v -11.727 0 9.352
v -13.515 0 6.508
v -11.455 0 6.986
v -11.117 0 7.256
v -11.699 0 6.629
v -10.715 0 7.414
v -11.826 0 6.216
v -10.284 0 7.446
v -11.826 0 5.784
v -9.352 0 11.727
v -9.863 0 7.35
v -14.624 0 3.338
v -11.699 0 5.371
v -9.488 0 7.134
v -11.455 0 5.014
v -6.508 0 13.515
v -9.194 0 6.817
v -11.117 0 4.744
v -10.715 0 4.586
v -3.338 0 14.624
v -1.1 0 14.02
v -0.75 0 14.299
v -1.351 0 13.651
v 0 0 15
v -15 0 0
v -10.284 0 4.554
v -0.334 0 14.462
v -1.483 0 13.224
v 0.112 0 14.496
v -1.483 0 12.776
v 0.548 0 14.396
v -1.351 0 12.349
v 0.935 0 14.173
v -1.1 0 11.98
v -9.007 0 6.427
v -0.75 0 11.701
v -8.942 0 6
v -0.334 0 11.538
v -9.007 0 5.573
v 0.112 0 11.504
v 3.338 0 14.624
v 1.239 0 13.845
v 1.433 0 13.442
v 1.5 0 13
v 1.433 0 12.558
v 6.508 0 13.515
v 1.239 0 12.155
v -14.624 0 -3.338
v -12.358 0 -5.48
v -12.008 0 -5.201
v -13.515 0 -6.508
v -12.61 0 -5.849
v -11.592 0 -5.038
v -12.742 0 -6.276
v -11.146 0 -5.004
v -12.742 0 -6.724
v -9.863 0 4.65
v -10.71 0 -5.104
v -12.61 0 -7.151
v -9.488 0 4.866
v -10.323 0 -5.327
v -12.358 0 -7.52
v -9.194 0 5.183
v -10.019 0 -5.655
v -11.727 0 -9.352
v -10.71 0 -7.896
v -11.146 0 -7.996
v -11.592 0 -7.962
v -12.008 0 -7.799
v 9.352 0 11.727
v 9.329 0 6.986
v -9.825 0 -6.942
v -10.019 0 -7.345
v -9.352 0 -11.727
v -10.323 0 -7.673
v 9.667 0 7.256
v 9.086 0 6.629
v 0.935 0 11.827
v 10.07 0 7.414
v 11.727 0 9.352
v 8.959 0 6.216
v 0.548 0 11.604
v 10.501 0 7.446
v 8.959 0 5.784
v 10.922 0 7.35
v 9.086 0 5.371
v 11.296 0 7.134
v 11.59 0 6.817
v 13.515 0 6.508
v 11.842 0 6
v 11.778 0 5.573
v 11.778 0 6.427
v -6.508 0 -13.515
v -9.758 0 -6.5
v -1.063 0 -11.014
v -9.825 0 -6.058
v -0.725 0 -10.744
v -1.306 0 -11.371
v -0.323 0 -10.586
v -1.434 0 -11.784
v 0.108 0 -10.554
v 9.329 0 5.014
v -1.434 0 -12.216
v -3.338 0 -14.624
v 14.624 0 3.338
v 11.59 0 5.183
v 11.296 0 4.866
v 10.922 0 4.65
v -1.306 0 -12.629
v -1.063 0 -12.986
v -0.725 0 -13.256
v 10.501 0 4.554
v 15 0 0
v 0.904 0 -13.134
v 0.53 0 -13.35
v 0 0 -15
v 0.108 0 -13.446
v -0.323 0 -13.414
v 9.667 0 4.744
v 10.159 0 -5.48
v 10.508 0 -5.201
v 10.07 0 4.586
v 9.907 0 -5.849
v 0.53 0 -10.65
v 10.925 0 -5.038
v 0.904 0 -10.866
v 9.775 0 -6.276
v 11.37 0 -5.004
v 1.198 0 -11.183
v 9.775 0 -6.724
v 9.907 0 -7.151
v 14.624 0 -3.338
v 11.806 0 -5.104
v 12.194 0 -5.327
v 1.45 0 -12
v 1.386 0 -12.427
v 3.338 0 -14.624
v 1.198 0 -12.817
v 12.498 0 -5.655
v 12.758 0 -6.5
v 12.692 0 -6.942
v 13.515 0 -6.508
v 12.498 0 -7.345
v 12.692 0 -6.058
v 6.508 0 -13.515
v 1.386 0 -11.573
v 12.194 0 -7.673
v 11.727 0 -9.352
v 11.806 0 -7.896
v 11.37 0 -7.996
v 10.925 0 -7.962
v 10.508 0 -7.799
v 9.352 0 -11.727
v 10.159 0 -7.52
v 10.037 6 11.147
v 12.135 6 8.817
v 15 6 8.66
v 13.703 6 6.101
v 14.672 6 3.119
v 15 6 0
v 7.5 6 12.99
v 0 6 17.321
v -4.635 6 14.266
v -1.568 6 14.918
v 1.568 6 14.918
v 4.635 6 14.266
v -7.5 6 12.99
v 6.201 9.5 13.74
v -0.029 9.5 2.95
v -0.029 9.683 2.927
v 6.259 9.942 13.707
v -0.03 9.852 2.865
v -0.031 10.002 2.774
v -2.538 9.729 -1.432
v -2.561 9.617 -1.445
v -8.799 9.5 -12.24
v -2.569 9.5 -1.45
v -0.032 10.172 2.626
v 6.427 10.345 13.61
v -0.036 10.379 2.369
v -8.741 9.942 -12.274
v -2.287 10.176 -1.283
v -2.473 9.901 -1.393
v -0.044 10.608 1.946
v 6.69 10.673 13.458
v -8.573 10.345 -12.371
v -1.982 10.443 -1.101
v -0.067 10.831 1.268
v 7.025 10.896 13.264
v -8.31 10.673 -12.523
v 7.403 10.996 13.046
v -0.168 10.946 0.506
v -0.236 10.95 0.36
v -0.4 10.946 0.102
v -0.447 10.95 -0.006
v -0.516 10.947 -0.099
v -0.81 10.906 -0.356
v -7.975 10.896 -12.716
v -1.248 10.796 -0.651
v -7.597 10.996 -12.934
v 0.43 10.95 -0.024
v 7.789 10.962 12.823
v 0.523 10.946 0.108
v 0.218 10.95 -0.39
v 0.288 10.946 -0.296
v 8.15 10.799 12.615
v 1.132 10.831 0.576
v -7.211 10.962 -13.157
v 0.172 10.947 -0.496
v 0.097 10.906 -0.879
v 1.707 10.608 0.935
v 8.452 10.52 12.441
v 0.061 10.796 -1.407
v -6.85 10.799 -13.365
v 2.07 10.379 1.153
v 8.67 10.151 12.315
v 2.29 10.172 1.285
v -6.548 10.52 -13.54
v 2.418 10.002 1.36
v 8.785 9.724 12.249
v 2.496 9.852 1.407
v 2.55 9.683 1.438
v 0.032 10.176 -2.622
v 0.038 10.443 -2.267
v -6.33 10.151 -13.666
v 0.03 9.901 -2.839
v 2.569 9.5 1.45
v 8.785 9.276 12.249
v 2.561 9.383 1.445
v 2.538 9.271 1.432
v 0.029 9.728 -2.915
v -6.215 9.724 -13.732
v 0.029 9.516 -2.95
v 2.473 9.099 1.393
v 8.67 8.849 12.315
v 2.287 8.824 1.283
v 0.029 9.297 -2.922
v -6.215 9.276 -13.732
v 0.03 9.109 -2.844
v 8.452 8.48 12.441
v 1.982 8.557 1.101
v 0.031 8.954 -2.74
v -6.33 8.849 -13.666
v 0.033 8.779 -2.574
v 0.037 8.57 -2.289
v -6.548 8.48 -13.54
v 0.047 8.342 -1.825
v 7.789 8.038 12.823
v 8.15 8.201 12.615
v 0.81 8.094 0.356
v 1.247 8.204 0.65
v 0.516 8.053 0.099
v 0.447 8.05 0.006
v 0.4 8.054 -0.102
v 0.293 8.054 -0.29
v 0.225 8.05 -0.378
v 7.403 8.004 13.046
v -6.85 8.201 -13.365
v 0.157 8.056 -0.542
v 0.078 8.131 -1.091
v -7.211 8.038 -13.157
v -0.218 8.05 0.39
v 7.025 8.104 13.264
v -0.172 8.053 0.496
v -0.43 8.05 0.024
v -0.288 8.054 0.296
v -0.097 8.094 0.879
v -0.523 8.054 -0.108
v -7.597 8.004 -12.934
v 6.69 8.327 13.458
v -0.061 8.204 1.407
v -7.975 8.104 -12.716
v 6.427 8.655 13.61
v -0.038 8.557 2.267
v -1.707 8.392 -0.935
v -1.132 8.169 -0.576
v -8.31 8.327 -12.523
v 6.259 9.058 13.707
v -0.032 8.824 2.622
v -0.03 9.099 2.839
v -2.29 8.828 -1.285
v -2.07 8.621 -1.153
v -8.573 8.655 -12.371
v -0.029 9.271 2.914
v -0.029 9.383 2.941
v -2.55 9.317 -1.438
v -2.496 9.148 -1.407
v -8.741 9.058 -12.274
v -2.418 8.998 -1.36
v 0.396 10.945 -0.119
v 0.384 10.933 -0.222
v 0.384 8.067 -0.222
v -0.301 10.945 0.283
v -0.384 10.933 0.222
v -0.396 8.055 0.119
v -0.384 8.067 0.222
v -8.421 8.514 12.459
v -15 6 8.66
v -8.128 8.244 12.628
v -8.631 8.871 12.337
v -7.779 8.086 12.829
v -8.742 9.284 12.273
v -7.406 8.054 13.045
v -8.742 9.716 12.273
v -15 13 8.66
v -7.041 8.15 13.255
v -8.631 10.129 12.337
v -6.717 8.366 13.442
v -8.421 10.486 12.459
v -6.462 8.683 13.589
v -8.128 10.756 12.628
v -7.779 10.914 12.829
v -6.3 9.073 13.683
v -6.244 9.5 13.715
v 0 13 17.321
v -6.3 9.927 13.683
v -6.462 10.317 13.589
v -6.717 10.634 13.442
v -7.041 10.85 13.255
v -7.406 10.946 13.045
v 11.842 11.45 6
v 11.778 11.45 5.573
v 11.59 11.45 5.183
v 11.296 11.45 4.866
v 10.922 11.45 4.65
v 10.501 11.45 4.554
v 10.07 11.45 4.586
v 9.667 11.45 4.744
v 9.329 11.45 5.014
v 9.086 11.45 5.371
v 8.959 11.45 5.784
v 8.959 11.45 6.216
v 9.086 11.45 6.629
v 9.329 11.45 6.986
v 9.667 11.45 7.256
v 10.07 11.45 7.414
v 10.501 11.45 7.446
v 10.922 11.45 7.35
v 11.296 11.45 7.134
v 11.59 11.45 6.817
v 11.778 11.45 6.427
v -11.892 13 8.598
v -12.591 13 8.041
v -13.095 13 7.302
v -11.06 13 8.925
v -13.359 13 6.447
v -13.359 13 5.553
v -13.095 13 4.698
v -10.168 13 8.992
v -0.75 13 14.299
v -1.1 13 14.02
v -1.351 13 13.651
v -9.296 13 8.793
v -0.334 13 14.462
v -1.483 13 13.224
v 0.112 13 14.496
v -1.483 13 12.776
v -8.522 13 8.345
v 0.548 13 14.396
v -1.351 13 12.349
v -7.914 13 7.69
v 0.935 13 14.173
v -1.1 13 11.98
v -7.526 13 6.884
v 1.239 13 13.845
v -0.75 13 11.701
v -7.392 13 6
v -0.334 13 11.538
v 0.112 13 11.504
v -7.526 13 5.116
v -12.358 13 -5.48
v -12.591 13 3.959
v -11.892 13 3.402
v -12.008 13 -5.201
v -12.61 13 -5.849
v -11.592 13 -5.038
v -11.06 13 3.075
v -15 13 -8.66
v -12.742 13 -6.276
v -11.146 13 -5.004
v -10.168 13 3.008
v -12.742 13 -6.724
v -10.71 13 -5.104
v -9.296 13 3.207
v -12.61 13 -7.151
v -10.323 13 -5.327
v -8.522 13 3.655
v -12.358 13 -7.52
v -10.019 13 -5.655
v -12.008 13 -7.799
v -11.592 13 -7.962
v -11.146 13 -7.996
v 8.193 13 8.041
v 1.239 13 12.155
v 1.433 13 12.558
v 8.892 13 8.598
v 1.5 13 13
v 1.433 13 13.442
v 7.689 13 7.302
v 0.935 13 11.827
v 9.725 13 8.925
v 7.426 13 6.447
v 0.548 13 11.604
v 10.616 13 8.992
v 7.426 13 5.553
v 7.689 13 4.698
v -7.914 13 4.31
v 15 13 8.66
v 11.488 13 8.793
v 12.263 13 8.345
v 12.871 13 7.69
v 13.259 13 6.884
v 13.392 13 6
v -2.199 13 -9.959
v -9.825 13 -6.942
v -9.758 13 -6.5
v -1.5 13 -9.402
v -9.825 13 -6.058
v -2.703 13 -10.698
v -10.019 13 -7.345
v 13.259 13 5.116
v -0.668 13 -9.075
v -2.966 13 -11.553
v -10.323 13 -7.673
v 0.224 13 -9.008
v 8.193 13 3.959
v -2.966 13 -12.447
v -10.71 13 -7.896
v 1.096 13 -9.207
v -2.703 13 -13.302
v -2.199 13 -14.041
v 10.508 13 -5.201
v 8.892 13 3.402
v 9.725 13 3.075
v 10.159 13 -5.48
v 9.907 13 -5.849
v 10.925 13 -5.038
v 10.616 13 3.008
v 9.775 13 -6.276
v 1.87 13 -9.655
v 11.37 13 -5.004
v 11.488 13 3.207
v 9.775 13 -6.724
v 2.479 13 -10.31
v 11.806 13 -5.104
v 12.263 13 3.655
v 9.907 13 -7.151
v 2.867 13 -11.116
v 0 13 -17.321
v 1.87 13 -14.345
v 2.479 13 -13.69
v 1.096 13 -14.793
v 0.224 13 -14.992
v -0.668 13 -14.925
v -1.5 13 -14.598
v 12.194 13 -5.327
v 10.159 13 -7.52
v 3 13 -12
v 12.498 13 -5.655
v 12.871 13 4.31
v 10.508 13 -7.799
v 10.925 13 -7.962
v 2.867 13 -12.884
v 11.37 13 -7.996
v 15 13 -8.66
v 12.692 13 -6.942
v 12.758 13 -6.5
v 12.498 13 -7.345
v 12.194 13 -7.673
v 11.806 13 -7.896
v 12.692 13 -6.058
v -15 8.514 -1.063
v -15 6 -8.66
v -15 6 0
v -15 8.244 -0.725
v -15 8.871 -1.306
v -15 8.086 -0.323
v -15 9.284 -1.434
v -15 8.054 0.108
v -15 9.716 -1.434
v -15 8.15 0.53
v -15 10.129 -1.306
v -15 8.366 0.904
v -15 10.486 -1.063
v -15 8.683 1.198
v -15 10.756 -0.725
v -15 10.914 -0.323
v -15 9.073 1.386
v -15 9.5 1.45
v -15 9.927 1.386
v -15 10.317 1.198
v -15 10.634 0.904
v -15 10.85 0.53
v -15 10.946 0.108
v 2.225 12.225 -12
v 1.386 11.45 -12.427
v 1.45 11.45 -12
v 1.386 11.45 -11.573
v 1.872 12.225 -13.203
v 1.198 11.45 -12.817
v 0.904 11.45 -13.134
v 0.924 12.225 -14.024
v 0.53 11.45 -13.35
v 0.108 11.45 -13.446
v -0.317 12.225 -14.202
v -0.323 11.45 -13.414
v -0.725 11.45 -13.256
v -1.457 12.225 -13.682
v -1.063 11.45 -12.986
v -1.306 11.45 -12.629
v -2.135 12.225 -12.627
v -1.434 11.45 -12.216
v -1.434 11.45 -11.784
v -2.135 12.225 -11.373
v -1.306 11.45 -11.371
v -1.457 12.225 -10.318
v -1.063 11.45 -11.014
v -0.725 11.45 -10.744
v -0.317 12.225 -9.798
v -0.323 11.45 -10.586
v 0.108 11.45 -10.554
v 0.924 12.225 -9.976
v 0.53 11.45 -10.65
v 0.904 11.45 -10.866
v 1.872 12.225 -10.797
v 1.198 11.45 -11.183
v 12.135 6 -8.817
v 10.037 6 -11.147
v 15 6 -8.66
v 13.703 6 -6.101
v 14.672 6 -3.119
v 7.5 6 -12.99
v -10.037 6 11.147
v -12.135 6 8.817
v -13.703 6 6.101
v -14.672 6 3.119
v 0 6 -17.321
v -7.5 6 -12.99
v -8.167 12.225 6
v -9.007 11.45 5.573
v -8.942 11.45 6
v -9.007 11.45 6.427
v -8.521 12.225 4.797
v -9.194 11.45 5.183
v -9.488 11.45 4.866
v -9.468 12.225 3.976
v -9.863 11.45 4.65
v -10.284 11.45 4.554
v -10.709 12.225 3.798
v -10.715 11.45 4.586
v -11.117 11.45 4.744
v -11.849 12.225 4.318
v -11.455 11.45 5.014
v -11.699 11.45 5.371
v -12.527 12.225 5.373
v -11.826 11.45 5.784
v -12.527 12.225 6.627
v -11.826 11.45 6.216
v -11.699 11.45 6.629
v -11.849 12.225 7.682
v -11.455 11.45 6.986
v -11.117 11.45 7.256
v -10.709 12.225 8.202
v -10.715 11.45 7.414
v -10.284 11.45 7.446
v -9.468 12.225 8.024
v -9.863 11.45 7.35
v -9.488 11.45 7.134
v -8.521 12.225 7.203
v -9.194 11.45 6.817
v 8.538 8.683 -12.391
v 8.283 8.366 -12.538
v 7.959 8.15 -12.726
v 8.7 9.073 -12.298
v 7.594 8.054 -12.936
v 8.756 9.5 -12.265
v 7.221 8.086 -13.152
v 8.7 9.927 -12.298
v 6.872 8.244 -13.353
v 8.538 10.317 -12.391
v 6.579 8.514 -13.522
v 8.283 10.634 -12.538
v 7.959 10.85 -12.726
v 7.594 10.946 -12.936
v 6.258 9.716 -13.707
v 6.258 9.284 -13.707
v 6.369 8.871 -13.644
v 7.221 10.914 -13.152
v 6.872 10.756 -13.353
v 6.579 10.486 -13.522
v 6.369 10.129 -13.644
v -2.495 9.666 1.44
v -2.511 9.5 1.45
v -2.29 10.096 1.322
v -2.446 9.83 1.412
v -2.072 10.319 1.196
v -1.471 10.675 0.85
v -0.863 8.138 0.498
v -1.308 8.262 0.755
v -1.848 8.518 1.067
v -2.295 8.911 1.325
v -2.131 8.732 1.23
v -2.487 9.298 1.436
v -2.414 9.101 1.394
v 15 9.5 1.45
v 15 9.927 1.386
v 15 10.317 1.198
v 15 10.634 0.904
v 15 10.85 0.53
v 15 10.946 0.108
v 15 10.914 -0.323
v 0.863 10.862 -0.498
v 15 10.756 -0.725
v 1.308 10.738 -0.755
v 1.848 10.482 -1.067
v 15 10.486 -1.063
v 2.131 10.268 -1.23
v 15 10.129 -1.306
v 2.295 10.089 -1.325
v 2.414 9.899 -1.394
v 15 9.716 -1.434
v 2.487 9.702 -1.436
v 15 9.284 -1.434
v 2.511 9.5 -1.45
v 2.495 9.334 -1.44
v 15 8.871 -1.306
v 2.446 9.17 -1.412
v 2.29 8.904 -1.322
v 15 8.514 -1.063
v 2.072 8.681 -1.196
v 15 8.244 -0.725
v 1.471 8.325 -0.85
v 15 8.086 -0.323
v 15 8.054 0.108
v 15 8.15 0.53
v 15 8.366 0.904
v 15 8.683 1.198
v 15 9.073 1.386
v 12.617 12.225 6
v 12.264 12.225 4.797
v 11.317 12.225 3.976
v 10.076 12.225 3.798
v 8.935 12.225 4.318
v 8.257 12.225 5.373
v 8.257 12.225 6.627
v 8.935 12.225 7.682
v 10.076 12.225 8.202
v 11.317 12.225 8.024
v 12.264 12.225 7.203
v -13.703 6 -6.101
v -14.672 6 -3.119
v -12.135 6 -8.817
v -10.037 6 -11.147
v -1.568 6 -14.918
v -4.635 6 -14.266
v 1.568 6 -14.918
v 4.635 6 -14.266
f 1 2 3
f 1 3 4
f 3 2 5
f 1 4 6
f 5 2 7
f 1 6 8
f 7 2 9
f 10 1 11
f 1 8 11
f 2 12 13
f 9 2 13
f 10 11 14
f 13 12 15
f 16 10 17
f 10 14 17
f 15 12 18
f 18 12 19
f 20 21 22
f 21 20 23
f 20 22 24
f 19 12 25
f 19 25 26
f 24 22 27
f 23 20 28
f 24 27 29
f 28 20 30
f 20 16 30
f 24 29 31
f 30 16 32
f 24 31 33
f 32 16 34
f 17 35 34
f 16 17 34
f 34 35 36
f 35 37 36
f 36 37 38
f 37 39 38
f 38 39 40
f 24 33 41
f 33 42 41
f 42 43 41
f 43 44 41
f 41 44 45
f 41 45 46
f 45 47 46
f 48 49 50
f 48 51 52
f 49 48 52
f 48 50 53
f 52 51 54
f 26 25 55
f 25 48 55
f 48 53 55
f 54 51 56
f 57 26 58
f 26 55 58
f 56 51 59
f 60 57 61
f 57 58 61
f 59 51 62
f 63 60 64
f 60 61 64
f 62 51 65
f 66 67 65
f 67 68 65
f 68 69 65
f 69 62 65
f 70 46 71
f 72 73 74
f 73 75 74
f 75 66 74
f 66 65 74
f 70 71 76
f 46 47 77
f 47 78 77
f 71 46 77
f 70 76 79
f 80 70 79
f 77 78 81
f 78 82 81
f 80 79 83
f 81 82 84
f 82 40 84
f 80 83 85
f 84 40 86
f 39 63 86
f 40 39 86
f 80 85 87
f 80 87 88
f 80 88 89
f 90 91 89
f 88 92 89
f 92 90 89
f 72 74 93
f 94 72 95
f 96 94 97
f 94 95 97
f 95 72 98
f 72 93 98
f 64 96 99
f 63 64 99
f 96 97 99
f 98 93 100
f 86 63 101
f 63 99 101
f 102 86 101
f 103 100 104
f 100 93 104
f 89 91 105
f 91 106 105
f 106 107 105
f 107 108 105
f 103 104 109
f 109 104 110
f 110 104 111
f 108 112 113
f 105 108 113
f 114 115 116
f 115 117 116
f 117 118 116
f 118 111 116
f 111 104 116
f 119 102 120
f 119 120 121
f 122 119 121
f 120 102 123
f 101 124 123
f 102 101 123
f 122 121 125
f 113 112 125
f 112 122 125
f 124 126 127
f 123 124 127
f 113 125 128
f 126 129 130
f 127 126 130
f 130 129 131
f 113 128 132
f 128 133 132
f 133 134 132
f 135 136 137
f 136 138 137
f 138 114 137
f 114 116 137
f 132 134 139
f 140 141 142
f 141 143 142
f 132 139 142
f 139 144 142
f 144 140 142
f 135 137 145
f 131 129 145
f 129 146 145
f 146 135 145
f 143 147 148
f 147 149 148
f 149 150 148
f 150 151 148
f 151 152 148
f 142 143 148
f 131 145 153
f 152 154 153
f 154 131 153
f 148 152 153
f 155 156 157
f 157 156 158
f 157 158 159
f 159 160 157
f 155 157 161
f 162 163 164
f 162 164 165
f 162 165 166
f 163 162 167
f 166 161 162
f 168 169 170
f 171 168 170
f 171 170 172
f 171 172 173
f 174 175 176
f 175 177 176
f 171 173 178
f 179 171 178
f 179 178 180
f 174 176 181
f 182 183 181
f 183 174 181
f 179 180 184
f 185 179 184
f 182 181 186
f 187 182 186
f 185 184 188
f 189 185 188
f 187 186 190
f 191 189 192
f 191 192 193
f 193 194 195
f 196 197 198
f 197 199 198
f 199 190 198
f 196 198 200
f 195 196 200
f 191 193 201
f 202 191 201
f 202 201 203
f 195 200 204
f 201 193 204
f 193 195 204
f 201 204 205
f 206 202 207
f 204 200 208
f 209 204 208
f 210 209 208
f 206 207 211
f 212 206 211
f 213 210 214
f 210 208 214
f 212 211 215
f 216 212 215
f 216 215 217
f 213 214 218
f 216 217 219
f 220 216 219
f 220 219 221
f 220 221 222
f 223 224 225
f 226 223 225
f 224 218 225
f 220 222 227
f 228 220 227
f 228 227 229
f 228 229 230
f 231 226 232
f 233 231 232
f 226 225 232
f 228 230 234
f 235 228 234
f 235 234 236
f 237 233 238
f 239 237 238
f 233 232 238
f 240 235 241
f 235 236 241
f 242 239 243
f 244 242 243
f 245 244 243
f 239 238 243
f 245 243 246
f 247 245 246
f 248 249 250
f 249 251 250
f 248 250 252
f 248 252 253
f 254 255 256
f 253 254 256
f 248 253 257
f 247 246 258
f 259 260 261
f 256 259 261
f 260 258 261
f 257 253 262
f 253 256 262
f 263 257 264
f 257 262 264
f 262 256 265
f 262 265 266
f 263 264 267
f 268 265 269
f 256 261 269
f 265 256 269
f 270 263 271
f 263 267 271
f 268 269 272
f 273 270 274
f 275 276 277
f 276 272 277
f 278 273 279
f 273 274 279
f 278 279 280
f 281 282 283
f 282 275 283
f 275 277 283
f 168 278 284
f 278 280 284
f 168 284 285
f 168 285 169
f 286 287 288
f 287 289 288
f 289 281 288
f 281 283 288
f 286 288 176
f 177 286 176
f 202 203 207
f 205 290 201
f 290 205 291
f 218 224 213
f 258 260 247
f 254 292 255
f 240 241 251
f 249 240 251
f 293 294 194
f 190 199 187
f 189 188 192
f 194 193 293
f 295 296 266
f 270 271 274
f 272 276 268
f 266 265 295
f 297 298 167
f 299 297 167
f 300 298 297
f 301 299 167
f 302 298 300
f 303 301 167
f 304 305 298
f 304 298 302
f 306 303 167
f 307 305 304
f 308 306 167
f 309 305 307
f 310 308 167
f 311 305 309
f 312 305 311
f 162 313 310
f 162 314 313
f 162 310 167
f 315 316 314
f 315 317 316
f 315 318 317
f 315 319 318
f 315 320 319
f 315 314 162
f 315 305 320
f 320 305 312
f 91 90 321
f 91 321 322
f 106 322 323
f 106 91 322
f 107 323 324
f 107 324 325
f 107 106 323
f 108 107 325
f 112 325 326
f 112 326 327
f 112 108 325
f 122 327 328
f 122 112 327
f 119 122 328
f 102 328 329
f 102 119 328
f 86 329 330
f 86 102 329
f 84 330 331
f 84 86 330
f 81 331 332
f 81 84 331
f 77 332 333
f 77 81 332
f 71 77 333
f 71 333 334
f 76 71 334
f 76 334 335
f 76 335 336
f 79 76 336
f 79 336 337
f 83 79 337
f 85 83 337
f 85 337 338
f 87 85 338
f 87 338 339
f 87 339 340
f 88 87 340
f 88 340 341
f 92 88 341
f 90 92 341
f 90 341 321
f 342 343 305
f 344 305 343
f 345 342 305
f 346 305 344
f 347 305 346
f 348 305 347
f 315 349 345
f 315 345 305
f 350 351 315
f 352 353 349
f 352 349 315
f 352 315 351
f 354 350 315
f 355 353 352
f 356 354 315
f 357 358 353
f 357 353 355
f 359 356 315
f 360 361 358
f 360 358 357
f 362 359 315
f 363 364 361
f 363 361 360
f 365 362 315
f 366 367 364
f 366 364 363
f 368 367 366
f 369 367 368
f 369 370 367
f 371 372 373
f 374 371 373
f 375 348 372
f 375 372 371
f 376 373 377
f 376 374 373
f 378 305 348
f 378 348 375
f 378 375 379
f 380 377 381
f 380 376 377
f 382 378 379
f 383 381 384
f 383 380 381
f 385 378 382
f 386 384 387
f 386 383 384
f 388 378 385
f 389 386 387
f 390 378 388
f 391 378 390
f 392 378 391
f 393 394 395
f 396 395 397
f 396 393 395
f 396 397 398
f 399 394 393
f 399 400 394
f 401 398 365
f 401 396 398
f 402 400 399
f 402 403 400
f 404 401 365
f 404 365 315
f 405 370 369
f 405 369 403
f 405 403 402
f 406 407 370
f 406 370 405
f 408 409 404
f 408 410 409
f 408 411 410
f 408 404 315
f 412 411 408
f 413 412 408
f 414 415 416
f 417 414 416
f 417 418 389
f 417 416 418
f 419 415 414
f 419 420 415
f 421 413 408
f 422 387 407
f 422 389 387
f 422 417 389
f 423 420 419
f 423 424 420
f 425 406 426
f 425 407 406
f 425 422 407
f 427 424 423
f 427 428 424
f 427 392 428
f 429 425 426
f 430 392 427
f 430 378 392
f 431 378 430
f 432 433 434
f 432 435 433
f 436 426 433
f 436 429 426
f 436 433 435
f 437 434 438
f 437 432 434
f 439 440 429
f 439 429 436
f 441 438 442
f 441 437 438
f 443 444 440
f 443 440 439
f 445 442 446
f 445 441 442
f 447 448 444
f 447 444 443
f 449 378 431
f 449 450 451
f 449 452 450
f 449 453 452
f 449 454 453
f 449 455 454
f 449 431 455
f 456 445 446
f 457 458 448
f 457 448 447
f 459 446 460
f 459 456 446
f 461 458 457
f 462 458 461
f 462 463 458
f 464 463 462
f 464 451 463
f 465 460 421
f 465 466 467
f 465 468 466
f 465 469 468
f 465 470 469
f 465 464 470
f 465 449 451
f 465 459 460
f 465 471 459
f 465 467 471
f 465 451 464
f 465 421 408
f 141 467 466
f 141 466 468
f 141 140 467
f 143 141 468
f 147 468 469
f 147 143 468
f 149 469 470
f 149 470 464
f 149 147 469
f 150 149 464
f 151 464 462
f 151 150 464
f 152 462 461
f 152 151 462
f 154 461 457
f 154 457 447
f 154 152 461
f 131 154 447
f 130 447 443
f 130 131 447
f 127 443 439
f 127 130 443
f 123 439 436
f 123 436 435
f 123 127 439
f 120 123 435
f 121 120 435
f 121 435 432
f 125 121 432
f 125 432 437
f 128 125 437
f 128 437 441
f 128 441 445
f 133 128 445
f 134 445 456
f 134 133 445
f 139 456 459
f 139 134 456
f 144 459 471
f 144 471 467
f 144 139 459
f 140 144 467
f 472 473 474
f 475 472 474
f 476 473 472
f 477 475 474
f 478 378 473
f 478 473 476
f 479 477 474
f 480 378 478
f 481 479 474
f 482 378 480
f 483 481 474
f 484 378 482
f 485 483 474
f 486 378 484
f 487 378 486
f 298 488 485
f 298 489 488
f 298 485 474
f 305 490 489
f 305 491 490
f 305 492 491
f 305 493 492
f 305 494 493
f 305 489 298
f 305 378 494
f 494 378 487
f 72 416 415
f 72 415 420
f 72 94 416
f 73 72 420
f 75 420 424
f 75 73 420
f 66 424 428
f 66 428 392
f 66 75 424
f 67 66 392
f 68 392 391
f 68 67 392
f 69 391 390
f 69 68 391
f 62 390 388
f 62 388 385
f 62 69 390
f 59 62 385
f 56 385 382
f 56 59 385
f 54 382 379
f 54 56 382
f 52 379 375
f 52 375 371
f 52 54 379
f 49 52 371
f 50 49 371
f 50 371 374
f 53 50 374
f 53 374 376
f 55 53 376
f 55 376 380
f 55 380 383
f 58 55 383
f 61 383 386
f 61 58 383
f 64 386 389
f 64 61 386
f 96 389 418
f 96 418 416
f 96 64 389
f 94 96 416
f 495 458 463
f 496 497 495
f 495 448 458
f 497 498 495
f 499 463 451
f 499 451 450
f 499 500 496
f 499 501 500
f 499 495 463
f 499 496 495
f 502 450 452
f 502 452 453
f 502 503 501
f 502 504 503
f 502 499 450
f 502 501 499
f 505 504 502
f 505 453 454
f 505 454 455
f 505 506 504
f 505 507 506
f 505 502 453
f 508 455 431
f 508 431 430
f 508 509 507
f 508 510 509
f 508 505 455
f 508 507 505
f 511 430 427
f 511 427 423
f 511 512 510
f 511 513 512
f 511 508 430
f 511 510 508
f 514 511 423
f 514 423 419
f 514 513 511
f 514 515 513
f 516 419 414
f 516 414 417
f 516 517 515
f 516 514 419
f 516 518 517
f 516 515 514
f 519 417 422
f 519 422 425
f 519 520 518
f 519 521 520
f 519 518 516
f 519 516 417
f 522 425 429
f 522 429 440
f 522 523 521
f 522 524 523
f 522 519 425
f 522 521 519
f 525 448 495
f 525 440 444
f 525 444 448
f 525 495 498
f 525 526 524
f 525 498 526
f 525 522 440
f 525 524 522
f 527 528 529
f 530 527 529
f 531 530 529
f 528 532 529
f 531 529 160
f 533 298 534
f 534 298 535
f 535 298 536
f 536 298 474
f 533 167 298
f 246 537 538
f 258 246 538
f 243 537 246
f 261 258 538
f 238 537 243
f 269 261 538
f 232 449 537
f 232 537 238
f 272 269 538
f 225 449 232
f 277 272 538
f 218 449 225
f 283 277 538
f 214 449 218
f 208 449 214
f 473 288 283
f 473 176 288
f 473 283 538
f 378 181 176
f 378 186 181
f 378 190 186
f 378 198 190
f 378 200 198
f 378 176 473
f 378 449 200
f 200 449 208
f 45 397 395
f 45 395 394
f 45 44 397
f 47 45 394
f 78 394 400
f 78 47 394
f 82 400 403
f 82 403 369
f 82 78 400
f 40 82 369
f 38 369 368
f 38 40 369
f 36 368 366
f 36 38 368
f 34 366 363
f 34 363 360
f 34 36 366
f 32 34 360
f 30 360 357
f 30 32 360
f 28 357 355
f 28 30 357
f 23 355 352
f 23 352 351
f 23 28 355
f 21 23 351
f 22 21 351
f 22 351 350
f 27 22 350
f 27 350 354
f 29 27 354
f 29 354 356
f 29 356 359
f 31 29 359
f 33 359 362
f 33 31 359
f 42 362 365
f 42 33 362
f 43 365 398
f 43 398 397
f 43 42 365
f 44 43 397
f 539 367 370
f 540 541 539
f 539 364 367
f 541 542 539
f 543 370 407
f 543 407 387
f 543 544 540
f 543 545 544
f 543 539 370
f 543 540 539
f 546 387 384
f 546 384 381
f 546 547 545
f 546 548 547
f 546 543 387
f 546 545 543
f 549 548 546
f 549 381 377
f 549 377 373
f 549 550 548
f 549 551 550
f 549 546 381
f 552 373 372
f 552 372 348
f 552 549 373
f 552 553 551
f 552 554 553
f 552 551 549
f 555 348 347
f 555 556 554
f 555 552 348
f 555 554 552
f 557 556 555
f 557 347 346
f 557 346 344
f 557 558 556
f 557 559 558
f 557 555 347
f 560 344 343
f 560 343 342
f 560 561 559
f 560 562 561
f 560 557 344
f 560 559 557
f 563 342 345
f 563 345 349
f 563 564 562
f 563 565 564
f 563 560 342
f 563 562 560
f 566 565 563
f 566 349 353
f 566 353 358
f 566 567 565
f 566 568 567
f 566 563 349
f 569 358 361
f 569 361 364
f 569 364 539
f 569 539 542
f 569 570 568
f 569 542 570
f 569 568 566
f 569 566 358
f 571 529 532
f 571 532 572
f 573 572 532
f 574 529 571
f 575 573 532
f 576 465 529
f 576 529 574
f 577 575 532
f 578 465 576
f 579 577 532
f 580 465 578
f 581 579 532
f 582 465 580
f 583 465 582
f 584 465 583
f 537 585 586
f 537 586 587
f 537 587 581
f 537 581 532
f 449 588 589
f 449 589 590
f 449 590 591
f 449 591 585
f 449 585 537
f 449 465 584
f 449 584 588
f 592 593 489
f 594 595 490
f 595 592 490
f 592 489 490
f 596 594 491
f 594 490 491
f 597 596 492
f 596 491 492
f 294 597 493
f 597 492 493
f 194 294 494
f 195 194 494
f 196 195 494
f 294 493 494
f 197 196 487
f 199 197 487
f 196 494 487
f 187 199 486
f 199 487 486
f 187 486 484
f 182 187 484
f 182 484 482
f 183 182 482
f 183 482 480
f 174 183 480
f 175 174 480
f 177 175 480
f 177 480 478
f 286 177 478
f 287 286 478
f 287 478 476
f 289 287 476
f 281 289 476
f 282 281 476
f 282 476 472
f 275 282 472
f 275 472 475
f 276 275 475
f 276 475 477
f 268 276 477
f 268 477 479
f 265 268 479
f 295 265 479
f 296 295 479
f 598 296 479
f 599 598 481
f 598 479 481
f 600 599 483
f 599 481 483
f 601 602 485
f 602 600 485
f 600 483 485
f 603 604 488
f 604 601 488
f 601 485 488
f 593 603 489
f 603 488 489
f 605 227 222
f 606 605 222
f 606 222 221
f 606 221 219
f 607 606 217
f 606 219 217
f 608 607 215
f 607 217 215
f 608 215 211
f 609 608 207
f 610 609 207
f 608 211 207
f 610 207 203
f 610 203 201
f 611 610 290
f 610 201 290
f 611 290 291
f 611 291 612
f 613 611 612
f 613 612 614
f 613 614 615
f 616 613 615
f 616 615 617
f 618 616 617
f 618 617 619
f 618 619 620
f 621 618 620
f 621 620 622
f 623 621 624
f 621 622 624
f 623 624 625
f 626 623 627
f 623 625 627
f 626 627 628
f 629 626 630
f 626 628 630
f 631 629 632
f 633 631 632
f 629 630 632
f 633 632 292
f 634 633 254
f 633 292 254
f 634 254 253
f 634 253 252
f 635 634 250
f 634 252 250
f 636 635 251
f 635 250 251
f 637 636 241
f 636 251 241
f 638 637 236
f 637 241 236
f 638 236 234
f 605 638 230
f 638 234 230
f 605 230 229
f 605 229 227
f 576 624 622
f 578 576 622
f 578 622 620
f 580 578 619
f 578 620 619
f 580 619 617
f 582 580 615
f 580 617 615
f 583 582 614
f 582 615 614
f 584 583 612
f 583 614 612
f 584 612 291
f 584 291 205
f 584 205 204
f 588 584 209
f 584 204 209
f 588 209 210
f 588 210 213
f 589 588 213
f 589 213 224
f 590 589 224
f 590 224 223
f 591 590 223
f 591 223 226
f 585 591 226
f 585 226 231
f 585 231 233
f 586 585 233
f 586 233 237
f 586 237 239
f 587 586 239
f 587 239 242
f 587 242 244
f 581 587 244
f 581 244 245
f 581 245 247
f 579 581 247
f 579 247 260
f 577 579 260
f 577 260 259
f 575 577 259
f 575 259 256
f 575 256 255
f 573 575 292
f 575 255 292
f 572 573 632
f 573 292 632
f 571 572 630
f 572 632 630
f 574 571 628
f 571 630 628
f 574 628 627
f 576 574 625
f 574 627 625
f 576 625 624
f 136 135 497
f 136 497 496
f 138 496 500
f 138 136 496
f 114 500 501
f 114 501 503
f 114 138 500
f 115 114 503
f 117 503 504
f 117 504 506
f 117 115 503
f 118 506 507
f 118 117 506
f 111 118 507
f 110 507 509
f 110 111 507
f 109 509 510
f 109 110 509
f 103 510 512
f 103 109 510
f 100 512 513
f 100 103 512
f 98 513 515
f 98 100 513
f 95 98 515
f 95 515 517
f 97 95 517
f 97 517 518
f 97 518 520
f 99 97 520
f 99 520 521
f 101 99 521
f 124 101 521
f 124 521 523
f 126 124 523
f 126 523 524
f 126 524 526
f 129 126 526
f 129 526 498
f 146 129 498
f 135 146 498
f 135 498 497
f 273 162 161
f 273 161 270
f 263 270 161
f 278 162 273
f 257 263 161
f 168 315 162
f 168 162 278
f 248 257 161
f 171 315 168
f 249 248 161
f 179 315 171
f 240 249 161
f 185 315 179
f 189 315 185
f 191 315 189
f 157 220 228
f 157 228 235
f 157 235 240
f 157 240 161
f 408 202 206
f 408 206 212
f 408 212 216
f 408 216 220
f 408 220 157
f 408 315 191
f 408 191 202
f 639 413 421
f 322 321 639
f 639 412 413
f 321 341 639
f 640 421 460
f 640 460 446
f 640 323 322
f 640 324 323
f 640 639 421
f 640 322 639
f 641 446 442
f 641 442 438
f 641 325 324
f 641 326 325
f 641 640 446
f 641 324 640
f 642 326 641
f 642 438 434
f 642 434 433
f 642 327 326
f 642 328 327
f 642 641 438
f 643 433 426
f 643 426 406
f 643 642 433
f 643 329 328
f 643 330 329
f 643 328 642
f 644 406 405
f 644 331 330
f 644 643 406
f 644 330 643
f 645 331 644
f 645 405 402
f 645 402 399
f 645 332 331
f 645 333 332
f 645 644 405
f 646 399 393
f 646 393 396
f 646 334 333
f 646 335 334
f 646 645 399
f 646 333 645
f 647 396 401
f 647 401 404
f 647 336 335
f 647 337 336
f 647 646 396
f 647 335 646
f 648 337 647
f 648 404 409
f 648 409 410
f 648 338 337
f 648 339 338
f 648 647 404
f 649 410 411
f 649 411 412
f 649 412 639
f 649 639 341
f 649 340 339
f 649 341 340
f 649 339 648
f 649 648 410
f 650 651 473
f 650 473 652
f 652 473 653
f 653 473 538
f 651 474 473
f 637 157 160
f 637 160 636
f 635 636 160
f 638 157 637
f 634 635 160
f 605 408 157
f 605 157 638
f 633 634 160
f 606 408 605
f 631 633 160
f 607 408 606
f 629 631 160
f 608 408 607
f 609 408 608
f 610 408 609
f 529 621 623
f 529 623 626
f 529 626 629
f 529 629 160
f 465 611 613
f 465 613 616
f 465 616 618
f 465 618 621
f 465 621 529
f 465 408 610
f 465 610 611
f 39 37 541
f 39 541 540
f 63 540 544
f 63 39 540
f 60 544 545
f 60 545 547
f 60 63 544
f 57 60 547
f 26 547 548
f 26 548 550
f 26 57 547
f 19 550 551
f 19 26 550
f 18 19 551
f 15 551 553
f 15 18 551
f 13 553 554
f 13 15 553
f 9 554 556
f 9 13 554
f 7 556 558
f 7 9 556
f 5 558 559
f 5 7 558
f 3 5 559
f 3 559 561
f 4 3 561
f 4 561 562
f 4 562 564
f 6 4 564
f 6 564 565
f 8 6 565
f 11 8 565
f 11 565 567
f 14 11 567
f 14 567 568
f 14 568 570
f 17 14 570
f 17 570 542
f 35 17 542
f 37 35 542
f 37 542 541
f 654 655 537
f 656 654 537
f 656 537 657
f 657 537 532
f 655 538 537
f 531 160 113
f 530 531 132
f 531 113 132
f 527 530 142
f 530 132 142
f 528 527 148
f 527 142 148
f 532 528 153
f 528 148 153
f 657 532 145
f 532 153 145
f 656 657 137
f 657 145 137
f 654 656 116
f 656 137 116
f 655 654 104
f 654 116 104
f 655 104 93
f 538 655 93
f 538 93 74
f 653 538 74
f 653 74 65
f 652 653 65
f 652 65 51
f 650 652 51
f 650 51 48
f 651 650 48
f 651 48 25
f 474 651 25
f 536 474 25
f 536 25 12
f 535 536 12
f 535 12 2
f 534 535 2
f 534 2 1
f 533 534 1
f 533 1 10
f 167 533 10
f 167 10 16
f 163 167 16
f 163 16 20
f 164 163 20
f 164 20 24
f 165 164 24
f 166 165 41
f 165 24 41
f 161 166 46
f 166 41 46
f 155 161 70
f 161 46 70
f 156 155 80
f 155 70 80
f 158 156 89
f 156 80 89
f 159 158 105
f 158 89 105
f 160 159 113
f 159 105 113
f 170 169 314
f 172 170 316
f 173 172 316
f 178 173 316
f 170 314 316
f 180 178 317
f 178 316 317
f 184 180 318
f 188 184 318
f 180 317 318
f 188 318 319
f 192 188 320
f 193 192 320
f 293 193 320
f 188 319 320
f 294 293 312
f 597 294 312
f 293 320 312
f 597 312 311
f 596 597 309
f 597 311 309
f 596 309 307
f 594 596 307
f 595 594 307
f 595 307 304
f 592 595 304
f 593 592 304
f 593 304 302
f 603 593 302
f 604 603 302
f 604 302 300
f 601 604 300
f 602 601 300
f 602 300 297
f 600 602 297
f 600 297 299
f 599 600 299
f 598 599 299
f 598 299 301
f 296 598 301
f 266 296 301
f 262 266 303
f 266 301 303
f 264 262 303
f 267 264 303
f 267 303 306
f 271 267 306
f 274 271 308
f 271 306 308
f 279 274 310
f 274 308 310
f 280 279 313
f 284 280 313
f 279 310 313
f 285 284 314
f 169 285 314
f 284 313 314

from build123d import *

# Parameters (mm, degrees)
SKETCH_1_R          = 15
SKETCH_1_R_2        = 1.45
SKETCH_1_R_3        = 1.5
EXTRUDE_1_DEPTH     = 13
SKETCH_2_R          = 1.45
SKETCH_2_R_2        = 1.5
EXTRUDE_2_DEPTH     = 7
SKETCH_3_R          = 1.45
CUT_EXTRUDE_1_DEPTH = 38.5
SKETCH_4_R          = 1.45
CUT_EXTRUDE_2_DEPTH = 38.5
SKETCH_5_R          = 1.45
CUT_EXTRUDE_3_DEPTH = 31
SKETCH_8_R          = 1.5
CUT_EXTRUDE_6_DEPTH = 38.5
CHAMFER_1_SIZE      = 1.55


with BuildPart() as part:
    # 草图1 → 凸台-拉伸1 (new body)
    with BuildSketch(Plane(origin=(0, 0, 0), x_dir=(1, 0, 0), z_dir=(0, 1, 0))):
        Circle(SKETCH_1_R)
        with Locations((0, 12)):
            Circle(SKETCH_1_R_2, mode=Mode.SUBTRACT)
        with Locations((-10.392304845, -6)):
            Circle(SKETCH_1_R_2, mode=Mode.SUBTRACT)
        with Locations((10.392304845, -6)):
            Circle(SKETCH_1_R_2, mode=Mode.SUBTRACT)
        with Locations((-11.258330249, 6.5)):
            Circle(SKETCH_1_R_3, mode=Mode.SUBTRACT)
        with Locations((0, -13)):
            Circle(SKETCH_1_R_3, mode=Mode.SUBTRACT)
        with Locations((11.258330249, 6.5)):
            Circle(SKETCH_1_R_3, mode=Mode.SUBTRACT)
    extrude(amount=EXTRUDE_1_DEPTH)

    # 草图2 → 凸台-拉伸2 (add)
    with BuildSketch(Plane(origin=(0, 13, 0), x_dir=(1, 0, 0), z_dir=(0, 1, 0))):
        Polygon((0, 17.320508076), (-15, 8.660254038), (-15, -8.660254038), (0, -17.320508076), (15, -8.660254038), (15, 8.660254038), align=None)
        with Locations((0, 12)):
            Circle(SKETCH_2_R, mode=Mode.SUBTRACT)
        with Locations((-11.258330249, 6.5)):
            Circle(SKETCH_2_R_2, mode=Mode.SUBTRACT)
        with Locations((11.258330249, 6.5)):
            Circle(SKETCH_2_R_2, mode=Mode.SUBTRACT)
        with Locations((-10.392304845, -6)):
            Circle(SKETCH_2_R, mode=Mode.SUBTRACT)
        with Locations((0, -13)):
            Circle(SKETCH_2_R_2, mode=Mode.SUBTRACT)
        with Locations((10.392304845, -6)):
            Circle(SKETCH_2_R, mode=Mode.SUBTRACT)
    extrude(amount=-EXTRUDE_2_DEPTH)

    # 草图3 → 切除-拉伸1 (cut, through all)
    with BuildSketch(Plane(origin=(7.5, 0, 12.990381057), x_dir=(0.866025404, 0, -0.5), z_dir=(0.5, 0, 0.866025404))):
        with Locations((0, 9.5)):
            Circle(SKETCH_3_R)
    extrude(amount=-CUT_EXTRUDE_1_DEPTH, mode=Mode.SUBTRACT)

    # 草图4 → 切除-拉伸2 (cut, through all)
    with BuildSketch(Plane(origin=(-7.5, 0, 12.990381057), x_dir=(0.866025404, 0, 0.5), z_dir=(-0.5, 0, 0.866025404))):
        with Locations((0, 9.5)):
            Circle(SKETCH_4_R)
    extrude(amount=-CUT_EXTRUDE_2_DEPTH, mode=Mode.SUBTRACT)

    # 草图5 → 切除-拉伸3 (cut, through all)
    with BuildSketch(Plane.ZY.offset(15)):
        with Locations((0, 9.5)):
            Circle(SKETCH_5_R)
    extrude(amount=-CUT_EXTRUDE_3_DEPTH, mode=Mode.SUBTRACT)

    # 草图8 → 切除-拉伸6 (cut, through all)
    with BuildSketch(Plane(origin=(-7.5, 0, -12.990381057), x_dir=(-0.866025404, 0, 0.5), z_dir=(-0.5, 0, -0.866025404))):
        with Locations((0, 9.5)):
            Circle(SKETCH_8_R)
    extrude(amount=-CUT_EXTRUDE_6_DEPTH, mode=Mode.SUBTRACT)

    # 倒角1
    chamfer_1_edges = [part.edges().sort_by_distance(p)[0] for p in [
        (8.942304845, 13, 6),
        (-1.45, 13, -12),
        (-11.842304845, 13, 6),
    ]]
    chamfer(chamfer_1_edges, length=CHAMFER_1_SIZE)


solid = part.part
